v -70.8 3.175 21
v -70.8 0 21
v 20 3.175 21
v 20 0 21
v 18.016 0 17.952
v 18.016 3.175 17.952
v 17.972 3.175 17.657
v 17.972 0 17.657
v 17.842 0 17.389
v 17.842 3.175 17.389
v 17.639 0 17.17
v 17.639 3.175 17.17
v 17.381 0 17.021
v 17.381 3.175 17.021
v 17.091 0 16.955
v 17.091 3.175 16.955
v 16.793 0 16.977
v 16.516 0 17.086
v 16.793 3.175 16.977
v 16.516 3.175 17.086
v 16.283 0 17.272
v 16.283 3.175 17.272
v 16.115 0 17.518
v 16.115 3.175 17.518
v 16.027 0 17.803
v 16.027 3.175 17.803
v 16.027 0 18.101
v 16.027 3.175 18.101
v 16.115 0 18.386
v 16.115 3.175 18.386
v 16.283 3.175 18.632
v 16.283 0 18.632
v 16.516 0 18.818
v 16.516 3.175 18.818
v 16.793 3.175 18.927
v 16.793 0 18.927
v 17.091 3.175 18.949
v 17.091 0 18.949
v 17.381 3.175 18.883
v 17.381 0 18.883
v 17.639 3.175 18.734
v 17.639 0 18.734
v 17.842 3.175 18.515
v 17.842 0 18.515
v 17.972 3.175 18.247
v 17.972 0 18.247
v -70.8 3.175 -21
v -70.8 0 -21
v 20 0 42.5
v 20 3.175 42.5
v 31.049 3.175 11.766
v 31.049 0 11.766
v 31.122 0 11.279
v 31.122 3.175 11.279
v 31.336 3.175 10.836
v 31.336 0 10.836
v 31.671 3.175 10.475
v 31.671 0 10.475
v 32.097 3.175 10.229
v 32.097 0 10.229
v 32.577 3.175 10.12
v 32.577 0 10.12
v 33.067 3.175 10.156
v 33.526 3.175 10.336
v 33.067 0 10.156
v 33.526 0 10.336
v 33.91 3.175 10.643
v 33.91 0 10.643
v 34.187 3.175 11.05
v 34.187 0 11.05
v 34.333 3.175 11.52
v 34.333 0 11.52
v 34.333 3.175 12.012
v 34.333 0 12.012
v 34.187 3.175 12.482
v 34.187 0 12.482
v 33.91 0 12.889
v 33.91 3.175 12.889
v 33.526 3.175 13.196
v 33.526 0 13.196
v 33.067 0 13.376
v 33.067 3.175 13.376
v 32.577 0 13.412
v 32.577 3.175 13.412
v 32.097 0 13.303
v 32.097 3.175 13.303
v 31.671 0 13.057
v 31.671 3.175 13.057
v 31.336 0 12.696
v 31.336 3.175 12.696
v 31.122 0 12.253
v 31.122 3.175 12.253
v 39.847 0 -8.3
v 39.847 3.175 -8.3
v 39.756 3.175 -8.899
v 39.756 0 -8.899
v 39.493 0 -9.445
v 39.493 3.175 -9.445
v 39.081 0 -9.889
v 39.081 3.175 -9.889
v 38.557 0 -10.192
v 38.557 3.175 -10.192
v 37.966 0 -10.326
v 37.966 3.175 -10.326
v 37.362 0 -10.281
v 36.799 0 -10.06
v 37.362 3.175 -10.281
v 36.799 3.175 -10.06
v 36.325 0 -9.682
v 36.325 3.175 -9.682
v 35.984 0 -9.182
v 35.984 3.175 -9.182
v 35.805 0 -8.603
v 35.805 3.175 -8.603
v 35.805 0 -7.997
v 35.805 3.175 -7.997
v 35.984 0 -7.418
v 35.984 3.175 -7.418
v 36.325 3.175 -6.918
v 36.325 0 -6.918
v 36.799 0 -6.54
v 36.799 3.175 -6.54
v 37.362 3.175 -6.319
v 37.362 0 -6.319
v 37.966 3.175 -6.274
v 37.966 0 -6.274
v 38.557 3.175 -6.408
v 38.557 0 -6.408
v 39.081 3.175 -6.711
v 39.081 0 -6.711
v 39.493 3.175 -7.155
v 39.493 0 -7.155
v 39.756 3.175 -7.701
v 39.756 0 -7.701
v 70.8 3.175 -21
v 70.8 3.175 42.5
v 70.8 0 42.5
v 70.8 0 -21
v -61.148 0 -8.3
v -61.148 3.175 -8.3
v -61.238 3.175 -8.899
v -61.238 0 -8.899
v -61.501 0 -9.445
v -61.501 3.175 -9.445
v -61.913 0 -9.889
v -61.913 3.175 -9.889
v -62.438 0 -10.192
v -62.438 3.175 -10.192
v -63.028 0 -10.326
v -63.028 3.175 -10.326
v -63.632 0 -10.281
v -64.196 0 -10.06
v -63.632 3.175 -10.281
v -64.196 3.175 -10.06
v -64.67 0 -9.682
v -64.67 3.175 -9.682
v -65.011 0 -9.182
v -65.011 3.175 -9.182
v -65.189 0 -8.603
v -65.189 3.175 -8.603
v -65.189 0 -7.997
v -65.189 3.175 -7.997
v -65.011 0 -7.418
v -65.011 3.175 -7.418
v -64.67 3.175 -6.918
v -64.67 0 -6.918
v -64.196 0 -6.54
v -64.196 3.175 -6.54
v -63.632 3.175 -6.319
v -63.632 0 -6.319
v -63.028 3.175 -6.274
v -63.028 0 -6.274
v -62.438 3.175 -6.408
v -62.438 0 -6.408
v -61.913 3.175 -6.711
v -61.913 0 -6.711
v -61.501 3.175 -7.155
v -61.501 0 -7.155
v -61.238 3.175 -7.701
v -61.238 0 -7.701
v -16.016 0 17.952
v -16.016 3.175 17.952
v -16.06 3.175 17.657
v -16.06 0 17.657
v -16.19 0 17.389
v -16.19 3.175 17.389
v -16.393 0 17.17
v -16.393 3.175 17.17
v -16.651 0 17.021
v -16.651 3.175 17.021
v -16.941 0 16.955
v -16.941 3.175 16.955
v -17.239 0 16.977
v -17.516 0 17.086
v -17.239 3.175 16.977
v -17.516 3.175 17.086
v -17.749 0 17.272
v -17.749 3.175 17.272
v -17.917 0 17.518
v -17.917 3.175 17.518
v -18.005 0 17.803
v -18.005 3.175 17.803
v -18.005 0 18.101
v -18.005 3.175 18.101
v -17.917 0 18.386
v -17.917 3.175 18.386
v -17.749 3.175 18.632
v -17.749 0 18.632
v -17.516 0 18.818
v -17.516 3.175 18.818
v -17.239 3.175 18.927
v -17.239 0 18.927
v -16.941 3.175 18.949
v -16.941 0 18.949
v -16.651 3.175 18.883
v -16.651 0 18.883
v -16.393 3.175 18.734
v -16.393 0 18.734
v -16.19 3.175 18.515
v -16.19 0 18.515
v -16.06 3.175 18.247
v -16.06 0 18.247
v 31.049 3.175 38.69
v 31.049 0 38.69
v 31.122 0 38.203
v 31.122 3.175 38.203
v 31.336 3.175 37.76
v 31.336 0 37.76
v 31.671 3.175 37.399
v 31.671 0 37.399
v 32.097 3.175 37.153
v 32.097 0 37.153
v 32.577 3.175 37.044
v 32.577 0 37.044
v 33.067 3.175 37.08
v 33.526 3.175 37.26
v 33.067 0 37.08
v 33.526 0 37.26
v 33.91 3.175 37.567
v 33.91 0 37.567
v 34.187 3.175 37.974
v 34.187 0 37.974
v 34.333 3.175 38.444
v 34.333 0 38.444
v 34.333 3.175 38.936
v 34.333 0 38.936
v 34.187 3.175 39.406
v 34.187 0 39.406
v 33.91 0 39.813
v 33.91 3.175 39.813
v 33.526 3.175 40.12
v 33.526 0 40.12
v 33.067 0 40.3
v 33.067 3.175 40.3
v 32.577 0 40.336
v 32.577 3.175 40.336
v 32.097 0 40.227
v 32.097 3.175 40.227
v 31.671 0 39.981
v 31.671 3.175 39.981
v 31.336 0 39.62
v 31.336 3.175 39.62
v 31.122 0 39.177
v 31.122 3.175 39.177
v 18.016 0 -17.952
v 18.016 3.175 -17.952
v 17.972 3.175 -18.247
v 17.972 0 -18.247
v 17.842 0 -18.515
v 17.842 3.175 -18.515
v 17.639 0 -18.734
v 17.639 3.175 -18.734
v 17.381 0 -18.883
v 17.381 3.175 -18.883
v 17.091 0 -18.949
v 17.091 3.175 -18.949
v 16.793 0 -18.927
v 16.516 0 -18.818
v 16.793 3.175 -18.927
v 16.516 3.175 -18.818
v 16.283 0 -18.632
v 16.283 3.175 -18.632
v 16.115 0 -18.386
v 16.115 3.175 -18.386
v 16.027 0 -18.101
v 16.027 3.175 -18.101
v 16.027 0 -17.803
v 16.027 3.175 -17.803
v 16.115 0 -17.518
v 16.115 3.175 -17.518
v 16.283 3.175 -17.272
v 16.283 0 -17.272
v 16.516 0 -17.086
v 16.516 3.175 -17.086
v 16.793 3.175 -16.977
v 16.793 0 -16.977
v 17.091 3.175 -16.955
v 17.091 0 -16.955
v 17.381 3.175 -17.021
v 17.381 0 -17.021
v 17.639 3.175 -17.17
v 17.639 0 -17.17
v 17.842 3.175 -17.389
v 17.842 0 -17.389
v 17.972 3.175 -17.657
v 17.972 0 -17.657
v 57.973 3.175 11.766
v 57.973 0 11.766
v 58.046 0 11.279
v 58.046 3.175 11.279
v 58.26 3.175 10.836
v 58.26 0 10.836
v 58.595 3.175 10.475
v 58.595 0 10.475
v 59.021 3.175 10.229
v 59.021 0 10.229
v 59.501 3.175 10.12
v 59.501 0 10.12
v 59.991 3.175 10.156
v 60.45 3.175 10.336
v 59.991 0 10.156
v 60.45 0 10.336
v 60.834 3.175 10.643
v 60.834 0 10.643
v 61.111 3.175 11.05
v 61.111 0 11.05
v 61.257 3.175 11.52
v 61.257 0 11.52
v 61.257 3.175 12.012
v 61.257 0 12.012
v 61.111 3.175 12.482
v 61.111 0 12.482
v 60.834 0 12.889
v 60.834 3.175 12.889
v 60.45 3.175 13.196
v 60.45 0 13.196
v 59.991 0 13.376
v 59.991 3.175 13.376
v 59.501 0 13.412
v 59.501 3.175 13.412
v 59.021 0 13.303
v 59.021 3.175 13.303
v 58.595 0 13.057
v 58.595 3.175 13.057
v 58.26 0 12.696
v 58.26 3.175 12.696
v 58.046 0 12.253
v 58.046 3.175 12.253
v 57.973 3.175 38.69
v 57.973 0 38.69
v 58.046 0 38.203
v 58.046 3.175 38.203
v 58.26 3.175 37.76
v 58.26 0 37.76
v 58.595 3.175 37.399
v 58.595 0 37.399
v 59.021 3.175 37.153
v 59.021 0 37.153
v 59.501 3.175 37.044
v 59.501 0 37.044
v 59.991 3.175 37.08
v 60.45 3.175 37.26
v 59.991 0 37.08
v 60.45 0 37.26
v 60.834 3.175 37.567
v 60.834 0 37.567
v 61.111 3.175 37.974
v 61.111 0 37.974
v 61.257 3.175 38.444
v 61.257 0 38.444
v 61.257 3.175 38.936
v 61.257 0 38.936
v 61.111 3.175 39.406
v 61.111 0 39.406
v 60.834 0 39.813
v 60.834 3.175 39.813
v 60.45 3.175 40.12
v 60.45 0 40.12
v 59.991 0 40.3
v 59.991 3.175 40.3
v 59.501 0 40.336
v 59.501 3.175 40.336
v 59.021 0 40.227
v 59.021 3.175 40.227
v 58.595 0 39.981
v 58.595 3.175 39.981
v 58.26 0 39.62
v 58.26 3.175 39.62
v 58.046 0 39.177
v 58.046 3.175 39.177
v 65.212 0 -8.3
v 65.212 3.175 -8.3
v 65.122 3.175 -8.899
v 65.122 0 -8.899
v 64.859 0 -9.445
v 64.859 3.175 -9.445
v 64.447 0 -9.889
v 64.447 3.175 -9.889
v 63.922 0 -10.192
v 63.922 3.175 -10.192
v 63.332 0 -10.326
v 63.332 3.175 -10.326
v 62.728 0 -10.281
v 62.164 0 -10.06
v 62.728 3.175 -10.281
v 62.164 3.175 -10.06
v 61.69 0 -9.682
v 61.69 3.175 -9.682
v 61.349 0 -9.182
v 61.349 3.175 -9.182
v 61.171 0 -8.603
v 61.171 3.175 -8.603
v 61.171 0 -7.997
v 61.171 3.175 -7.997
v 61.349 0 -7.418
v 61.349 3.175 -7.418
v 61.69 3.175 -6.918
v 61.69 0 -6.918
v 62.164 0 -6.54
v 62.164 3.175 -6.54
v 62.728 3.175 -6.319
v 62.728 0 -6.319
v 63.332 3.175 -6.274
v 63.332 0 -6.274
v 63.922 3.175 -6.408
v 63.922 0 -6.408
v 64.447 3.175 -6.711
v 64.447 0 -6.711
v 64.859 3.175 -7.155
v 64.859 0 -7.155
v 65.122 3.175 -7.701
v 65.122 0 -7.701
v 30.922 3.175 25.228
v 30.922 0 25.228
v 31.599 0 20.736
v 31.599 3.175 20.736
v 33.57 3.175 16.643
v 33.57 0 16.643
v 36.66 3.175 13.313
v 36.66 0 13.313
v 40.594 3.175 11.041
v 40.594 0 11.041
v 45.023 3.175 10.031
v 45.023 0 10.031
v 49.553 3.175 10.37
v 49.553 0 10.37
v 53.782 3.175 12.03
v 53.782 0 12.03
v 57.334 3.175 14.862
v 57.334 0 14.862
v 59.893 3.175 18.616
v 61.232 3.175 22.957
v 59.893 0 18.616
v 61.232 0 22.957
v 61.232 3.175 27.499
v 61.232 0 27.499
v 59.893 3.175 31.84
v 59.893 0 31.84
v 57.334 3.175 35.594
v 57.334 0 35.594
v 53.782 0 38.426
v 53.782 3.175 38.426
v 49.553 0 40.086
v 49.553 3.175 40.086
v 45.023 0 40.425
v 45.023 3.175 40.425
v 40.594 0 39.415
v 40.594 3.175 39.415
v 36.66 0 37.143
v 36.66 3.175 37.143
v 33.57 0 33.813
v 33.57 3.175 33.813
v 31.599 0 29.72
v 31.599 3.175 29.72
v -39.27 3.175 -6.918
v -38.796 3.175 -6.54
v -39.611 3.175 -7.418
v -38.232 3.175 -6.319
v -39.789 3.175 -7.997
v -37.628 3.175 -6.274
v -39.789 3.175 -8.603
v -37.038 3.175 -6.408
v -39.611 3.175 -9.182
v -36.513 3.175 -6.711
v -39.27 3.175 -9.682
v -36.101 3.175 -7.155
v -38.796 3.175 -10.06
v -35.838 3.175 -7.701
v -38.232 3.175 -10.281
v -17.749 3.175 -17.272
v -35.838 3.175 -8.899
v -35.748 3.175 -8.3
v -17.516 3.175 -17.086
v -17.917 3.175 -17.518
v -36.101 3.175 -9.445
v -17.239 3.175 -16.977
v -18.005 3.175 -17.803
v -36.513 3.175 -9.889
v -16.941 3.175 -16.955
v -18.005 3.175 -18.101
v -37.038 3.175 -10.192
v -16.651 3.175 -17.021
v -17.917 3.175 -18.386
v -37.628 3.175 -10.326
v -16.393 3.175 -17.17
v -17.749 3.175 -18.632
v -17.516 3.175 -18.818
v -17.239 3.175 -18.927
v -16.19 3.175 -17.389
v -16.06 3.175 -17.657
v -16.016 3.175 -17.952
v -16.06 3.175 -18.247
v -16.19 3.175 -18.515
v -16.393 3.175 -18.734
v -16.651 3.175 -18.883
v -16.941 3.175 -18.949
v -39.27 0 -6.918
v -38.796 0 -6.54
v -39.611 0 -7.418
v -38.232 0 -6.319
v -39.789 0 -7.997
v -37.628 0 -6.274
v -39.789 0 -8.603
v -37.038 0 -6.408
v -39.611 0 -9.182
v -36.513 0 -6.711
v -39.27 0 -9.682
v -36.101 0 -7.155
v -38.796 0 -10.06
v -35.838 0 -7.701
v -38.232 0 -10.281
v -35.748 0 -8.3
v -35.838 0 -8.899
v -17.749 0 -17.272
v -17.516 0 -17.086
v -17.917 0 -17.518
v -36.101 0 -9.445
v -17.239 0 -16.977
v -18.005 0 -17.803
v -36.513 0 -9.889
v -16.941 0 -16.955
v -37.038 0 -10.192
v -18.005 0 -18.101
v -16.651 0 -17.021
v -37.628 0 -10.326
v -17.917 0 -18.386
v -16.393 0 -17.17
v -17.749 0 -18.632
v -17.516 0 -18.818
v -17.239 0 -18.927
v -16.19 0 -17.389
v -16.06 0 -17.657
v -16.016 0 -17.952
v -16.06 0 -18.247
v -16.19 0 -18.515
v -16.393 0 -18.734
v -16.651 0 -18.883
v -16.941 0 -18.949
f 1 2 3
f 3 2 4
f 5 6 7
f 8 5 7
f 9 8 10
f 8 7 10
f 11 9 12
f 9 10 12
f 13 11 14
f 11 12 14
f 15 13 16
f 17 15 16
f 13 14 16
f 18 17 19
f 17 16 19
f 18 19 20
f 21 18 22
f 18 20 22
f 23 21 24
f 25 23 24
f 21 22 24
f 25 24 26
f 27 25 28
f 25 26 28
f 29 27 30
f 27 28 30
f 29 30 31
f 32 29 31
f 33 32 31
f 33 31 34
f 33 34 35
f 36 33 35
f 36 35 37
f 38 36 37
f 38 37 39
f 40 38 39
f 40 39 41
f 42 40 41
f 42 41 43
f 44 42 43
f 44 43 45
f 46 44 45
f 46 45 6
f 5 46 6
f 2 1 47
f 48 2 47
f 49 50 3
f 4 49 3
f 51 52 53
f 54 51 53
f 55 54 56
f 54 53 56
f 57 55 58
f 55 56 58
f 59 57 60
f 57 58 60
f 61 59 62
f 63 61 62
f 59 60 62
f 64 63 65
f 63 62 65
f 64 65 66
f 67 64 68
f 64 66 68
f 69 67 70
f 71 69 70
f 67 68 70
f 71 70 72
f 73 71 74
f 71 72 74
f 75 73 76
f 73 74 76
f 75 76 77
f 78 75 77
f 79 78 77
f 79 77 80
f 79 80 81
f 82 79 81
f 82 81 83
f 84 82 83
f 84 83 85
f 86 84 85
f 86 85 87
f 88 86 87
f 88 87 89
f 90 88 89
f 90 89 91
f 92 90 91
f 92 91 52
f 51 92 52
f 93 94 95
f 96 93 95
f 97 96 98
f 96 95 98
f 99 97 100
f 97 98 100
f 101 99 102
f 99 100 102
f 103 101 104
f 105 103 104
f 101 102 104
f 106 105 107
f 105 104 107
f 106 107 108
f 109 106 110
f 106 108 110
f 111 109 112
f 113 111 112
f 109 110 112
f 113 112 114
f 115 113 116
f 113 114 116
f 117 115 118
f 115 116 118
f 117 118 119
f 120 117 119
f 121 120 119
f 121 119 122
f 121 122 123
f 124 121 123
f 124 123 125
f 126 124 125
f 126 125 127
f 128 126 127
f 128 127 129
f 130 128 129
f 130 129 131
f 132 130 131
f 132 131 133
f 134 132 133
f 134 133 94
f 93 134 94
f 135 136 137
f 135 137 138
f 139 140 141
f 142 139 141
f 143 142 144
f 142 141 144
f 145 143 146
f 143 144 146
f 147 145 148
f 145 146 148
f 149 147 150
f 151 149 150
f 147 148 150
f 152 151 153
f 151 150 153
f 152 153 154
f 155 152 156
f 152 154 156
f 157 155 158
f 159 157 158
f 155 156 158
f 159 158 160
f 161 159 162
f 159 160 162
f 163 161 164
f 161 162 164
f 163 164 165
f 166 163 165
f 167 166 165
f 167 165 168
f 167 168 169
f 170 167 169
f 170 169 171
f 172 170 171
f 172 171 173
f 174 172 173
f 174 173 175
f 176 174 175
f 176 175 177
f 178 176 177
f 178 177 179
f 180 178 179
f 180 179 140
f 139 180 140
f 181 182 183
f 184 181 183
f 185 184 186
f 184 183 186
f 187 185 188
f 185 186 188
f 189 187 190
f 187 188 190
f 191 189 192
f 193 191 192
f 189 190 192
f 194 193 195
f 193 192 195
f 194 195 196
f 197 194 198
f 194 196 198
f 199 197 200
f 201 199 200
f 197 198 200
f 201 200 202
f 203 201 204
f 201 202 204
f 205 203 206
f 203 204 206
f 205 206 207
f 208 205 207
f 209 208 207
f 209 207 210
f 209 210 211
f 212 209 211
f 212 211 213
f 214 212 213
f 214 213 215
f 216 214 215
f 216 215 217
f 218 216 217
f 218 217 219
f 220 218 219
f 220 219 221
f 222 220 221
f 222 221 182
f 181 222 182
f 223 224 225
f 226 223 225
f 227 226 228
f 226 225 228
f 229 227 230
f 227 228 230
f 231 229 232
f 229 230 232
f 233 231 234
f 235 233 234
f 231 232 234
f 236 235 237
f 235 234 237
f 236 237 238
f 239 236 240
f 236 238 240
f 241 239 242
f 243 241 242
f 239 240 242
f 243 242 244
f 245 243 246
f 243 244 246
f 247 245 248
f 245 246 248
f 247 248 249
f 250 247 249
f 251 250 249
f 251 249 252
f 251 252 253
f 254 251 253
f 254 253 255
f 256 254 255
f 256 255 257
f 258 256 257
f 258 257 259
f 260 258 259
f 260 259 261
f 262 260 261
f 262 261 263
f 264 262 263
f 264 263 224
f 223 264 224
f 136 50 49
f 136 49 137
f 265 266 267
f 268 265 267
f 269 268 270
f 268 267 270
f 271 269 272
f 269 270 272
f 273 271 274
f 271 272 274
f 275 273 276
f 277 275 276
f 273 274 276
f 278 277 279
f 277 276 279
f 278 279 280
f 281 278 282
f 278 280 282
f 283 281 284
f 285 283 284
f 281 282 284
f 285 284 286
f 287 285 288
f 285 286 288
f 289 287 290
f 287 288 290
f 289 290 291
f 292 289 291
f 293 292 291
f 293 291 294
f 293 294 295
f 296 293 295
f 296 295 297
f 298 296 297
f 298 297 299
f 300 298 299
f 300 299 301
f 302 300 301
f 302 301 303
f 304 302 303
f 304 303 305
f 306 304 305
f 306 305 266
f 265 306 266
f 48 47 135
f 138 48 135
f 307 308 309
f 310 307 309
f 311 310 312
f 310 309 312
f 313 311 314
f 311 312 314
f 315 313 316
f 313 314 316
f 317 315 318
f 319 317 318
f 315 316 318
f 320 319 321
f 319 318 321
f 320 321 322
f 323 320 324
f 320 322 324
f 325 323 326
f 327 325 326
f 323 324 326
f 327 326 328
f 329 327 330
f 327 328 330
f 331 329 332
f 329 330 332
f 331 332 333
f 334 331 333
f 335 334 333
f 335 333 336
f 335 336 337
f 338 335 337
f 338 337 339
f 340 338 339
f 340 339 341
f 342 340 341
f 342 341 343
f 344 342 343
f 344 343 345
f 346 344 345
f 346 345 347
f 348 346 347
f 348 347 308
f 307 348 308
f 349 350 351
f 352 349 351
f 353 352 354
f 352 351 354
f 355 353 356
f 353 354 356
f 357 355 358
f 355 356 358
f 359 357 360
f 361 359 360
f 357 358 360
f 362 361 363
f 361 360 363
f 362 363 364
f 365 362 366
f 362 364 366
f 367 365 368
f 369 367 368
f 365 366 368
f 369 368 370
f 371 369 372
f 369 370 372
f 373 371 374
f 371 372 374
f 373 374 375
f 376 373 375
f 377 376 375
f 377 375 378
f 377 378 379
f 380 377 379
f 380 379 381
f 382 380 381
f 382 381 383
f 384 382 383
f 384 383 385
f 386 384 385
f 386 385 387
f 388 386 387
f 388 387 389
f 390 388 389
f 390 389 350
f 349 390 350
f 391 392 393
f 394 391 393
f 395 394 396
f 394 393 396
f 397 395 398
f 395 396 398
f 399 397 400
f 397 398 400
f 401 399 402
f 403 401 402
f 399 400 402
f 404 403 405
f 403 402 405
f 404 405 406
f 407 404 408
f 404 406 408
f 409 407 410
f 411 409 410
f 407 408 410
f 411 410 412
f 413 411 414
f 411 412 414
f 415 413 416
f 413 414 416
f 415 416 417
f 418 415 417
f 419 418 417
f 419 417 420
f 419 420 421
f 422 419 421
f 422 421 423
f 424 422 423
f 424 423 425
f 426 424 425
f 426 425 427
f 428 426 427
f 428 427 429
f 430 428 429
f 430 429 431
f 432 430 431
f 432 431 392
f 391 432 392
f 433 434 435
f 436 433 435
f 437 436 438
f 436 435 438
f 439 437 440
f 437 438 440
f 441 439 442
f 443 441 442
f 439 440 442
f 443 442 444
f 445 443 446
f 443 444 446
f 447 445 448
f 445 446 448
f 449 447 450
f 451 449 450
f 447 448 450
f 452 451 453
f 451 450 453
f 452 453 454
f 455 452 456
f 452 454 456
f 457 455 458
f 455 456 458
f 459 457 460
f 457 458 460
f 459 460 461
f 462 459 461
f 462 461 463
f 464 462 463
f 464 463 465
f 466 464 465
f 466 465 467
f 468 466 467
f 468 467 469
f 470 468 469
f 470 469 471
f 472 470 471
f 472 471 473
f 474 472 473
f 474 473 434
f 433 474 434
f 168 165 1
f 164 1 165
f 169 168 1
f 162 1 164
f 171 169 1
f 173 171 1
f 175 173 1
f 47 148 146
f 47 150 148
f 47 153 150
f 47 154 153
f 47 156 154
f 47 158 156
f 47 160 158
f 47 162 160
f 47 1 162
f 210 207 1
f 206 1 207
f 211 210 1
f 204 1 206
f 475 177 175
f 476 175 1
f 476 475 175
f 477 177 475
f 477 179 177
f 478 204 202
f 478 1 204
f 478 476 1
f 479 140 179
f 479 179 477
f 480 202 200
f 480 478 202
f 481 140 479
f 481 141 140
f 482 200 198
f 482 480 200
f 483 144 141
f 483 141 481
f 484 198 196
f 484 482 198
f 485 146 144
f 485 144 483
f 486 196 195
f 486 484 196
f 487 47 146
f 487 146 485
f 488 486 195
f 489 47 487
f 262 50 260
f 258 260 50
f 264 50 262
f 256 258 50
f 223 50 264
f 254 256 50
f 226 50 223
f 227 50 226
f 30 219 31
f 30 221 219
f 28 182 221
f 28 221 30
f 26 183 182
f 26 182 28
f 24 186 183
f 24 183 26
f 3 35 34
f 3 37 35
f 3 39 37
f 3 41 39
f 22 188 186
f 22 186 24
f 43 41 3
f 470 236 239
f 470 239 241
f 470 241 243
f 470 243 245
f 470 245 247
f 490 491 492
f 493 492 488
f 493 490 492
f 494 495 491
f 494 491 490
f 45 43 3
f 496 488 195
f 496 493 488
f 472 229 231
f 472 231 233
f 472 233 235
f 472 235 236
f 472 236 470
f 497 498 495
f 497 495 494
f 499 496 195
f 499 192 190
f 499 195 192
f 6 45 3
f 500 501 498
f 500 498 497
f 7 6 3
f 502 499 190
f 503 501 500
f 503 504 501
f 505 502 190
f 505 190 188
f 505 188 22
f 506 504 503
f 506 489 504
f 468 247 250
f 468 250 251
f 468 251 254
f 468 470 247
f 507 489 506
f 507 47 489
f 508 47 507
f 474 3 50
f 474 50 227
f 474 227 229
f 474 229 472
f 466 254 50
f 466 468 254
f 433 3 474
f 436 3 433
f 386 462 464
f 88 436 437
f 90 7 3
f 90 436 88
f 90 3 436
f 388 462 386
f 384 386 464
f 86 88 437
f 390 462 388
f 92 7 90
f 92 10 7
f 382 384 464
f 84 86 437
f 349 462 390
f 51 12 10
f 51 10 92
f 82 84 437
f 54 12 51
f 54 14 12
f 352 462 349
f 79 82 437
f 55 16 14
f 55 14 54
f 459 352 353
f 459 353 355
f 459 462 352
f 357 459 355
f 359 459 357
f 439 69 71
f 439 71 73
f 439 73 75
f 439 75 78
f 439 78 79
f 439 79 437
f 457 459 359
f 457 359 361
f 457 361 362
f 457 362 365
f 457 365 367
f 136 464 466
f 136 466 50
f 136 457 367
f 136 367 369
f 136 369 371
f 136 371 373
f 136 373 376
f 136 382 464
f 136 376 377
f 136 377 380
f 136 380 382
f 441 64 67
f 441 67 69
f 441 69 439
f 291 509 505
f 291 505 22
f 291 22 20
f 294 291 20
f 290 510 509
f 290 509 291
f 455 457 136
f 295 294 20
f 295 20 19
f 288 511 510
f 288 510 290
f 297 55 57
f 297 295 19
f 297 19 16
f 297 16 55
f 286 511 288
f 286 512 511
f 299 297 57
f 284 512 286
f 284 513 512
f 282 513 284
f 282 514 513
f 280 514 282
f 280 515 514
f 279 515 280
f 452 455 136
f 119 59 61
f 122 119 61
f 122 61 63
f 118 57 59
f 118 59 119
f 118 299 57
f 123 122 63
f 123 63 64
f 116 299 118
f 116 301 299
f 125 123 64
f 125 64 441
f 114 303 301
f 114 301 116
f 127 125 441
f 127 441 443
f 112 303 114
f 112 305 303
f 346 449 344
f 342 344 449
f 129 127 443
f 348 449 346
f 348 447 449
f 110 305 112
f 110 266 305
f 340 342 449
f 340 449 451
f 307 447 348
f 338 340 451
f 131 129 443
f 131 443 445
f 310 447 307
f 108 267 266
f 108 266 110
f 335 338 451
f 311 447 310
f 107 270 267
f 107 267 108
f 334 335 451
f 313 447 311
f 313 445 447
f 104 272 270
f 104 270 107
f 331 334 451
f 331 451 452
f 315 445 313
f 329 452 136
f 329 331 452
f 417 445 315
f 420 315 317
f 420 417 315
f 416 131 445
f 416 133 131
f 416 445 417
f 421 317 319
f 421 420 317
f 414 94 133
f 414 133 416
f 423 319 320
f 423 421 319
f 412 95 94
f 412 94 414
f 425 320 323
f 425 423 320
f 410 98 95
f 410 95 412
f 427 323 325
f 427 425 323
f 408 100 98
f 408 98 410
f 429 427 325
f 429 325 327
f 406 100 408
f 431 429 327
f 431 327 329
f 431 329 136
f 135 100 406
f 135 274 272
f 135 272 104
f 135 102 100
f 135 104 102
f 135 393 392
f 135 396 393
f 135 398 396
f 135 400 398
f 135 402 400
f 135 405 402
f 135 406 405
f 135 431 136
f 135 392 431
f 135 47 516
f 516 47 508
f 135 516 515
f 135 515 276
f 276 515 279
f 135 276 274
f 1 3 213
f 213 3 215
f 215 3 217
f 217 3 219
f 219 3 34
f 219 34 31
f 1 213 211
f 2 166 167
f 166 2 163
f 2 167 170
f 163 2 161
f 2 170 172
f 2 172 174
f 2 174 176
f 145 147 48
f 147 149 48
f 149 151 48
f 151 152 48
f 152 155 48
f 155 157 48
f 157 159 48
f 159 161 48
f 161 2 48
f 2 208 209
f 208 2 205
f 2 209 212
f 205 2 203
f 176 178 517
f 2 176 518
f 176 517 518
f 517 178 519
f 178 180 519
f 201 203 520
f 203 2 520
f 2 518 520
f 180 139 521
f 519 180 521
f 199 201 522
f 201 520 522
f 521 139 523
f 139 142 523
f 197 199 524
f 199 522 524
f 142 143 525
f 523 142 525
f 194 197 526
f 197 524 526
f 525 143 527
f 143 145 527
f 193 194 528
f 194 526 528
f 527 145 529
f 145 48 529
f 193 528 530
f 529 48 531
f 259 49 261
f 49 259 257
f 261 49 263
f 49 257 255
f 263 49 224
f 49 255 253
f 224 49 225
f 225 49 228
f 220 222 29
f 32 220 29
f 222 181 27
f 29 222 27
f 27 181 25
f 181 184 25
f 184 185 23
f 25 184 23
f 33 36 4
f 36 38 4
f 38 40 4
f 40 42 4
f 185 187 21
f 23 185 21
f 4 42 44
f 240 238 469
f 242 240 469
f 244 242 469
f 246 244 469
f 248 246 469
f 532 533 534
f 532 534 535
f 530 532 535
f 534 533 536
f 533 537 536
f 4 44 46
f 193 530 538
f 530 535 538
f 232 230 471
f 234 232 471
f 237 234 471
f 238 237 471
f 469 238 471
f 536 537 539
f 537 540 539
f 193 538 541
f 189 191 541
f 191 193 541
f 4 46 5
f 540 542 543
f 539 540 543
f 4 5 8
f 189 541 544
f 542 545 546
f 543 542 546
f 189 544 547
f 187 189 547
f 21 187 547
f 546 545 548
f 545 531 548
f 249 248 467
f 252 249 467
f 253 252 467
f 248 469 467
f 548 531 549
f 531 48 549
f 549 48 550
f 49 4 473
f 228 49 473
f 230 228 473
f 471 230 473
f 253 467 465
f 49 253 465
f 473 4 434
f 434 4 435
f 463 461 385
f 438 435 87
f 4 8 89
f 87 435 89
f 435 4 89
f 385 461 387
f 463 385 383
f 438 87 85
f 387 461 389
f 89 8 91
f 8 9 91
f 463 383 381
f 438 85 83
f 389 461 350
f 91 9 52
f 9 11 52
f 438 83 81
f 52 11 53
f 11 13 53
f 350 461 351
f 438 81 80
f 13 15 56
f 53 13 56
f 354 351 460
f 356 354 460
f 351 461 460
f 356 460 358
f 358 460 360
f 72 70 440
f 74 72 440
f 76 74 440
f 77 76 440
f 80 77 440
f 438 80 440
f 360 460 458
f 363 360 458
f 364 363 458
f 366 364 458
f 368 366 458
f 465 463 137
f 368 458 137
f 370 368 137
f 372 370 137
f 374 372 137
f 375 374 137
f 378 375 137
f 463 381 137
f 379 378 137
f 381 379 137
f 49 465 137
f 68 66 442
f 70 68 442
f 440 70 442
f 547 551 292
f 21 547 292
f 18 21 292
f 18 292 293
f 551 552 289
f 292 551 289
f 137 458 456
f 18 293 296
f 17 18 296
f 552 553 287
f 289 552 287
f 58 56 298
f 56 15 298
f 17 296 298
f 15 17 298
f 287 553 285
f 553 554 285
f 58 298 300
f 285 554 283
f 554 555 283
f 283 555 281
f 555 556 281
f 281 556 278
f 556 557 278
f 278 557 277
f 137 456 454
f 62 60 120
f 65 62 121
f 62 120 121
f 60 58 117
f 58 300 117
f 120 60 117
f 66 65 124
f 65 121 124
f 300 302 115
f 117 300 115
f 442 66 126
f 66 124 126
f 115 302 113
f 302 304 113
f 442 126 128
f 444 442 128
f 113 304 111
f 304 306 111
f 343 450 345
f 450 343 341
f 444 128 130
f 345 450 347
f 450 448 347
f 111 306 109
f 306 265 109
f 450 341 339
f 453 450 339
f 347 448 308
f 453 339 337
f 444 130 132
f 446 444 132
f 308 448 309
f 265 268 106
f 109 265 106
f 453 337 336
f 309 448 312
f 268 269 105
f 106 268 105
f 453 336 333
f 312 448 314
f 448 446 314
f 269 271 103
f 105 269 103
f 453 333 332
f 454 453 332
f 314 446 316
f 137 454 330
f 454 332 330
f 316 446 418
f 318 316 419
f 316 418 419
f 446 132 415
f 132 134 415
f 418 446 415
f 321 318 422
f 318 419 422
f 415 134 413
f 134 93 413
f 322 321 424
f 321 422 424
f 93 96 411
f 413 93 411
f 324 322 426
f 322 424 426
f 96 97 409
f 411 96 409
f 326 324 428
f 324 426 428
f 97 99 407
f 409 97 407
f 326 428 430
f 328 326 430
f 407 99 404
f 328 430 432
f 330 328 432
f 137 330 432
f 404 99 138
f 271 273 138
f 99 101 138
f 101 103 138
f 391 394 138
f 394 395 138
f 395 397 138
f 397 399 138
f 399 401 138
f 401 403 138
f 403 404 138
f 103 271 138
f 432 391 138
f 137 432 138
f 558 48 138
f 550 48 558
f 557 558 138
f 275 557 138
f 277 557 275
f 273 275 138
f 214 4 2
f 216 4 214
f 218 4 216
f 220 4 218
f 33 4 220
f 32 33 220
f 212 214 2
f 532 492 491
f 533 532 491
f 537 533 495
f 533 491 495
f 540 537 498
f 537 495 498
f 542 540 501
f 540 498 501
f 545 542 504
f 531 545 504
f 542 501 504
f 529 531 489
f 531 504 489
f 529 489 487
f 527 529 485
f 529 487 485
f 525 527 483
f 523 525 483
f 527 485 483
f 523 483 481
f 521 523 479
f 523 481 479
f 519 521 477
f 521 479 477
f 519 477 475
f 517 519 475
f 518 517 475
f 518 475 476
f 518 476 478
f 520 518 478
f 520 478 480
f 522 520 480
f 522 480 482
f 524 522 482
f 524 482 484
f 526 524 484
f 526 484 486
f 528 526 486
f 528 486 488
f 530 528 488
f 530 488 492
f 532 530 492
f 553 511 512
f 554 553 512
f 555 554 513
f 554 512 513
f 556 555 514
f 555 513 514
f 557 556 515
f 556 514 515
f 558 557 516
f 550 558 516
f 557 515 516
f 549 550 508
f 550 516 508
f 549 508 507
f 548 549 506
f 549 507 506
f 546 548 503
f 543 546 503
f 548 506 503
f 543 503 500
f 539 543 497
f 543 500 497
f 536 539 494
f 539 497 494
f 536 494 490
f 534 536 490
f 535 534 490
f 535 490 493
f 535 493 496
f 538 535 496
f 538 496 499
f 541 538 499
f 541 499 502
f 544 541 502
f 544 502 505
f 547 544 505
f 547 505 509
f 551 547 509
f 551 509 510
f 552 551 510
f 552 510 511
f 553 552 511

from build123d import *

# Parameters (mm, degrees)
SKETCH1_W               = 40
SKETCH1_H               = 42
BOSS_EXTRUDE1_DEPTH     = 3.175
SKETCH2_R               = 1
CUT_EXTRUDE1_DEPTH      = 4.175
SKETCH3_W               = 50.8
SKETCH3_H               = 63.5
BOSS_EXTRUDE2_DEPTH     = 3.175
SKETCH4_R               = 2.032
CUT_EXTRUDE2_DEPTH      = 4.175
SKETCH8_R               = 1.651
CUT_EXTRUDE5_DEPTH      = 4.175
SKETCH9_R               = 15.24
CUT_EXTRUDE6_DEPTH      = 4.175
SKETCH10_W              = 50.8
SKETCH10_H              = 21.5
CUT_EXTRUDE7_DEPTH      = 1
CUT_EXTRUDE7_DEPTH_BACK = 4.175


with BuildPart() as part:
    # Sketch1 → Boss-Extrude1 (new body)
    with BuildSketch(Plane(origin=(0, 0, 0), x_dir=(1, 0, 0), z_dir=(0, 1, 0))):
        Rectangle(SKETCH1_W, SKETCH1_H)
    extrude(amount=BOSS_EXTRUDE1_DEPTH)

    # Sketch2 → Cut-Extrude1 (cut, through all)
    with BuildSketch(Plane(origin=(0, 3.175, 0), x_dir=(1, 0, 0), z_dir=(0, 1, 0))):
        with Locations((17.015999872, -17.952)):
            Circle(SKETCH2_R)
        with Locations((-17.015999872, -17.952)):
            Circle(SKETCH2_R)
        with Locations((17.015999872, 17.952)):
            Circle(SKETCH2_R)
        with Locations((-17.015999872, 17.952)):
            Circle(SKETCH2_R)
    extrude(amount=-CUT_EXTRUDE1_DEPTH, mode=Mode.SUBTRACT)

    # Sketch3 → Boss-Extrude2 (add)
    with BuildSketch(Plane(origin=(0, 3.175, 0), x_dir=(1, 0, 0), z_dir=(0, 1, 0))):
        with Locations((45.4, -10.75)):
            Rectangle(SKETCH3_W, SKETCH3_H)
        with Locations((-45.4, -10.75)):
            Rectangle(SKETCH3_W, SKETCH3_H)
    extrude(amount=-BOSS_EXTRUDE2_DEPTH)

    # Sketch4 → Cut-Extrude2 (cut, through all)
    with BuildSketch(Plane(origin=(0, 3.175, 0), x_dir=(1, 0, 0), z_dir=(0, 1, 0))):
        with Locations((63.18, 8.3)):
            Circle(SKETCH4_R)
        with Locations((37.814543867, 8.3)):
            Circle(SKETCH4_R)
        with Locations((-37.78, 8.3)):
            Circle(SKETCH4_R)
        with Locations((-63.18, 8.3)):
            Circle(SKETCH4_R)
    extrude(amount=-CUT_EXTRUDE2_DEPTH, mode=Mode.SUBTRACT)

    # Sketch8 → Cut-Extrude5 (cut, through all)
    with BuildSketch(Plane(origin=(0, 0, 0), x_dir=(-1, 0, 0), z_dir=(0, -1, 0))):
        with Locations((-32.7, -38.69)):
            Circle(SKETCH8_R)
        with Locations((-32.7, -11.766)):
            Circle(SKETCH8_R)
        with Locations((-59.624, -38.69)):
            Circle(SKETCH8_R)
        with Locations((-59.624, -11.766)):
            Circle(SKETCH8_R)
    extrude(amount=-CUT_EXTRUDE5_DEPTH, mode=Mode.SUBTRACT)

    # Sketch9 → Cut-Extrude6 (cut, through all)
    with BuildSketch(Plane(origin=(0, 0, 0), x_dir=(-1, 0, 0), z_dir=(0, -1, 0))):
        with Locations((-46.162, -25.228)):
            Circle(SKETCH9_R)
    extrude(amount=-CUT_EXTRUDE6_DEPTH, mode=Mode.SUBTRACT)

    # Sketch10 → Cut-Extrude7 (cut, two sides)
    with BuildSketch(Plane(origin=(0, 3.175, 0), x_dir=(1, 0, 0), z_dir=(0, 1, 0))) as cut_extrude7_sk:
        with Locations((-45.4, -31.75)):
            Rectangle(SKETCH10_W, SKETCH10_H)
    extrude(amount=CUT_EXTRUDE7_DEPTH, mode=Mode.SUBTRACT)
    extrude(cut_extrude7_sk.sketch, amount=-CUT_EXTRUDE7_DEPTH_BACK, mode=Mode.SUBTRACT)


solid = part.part
